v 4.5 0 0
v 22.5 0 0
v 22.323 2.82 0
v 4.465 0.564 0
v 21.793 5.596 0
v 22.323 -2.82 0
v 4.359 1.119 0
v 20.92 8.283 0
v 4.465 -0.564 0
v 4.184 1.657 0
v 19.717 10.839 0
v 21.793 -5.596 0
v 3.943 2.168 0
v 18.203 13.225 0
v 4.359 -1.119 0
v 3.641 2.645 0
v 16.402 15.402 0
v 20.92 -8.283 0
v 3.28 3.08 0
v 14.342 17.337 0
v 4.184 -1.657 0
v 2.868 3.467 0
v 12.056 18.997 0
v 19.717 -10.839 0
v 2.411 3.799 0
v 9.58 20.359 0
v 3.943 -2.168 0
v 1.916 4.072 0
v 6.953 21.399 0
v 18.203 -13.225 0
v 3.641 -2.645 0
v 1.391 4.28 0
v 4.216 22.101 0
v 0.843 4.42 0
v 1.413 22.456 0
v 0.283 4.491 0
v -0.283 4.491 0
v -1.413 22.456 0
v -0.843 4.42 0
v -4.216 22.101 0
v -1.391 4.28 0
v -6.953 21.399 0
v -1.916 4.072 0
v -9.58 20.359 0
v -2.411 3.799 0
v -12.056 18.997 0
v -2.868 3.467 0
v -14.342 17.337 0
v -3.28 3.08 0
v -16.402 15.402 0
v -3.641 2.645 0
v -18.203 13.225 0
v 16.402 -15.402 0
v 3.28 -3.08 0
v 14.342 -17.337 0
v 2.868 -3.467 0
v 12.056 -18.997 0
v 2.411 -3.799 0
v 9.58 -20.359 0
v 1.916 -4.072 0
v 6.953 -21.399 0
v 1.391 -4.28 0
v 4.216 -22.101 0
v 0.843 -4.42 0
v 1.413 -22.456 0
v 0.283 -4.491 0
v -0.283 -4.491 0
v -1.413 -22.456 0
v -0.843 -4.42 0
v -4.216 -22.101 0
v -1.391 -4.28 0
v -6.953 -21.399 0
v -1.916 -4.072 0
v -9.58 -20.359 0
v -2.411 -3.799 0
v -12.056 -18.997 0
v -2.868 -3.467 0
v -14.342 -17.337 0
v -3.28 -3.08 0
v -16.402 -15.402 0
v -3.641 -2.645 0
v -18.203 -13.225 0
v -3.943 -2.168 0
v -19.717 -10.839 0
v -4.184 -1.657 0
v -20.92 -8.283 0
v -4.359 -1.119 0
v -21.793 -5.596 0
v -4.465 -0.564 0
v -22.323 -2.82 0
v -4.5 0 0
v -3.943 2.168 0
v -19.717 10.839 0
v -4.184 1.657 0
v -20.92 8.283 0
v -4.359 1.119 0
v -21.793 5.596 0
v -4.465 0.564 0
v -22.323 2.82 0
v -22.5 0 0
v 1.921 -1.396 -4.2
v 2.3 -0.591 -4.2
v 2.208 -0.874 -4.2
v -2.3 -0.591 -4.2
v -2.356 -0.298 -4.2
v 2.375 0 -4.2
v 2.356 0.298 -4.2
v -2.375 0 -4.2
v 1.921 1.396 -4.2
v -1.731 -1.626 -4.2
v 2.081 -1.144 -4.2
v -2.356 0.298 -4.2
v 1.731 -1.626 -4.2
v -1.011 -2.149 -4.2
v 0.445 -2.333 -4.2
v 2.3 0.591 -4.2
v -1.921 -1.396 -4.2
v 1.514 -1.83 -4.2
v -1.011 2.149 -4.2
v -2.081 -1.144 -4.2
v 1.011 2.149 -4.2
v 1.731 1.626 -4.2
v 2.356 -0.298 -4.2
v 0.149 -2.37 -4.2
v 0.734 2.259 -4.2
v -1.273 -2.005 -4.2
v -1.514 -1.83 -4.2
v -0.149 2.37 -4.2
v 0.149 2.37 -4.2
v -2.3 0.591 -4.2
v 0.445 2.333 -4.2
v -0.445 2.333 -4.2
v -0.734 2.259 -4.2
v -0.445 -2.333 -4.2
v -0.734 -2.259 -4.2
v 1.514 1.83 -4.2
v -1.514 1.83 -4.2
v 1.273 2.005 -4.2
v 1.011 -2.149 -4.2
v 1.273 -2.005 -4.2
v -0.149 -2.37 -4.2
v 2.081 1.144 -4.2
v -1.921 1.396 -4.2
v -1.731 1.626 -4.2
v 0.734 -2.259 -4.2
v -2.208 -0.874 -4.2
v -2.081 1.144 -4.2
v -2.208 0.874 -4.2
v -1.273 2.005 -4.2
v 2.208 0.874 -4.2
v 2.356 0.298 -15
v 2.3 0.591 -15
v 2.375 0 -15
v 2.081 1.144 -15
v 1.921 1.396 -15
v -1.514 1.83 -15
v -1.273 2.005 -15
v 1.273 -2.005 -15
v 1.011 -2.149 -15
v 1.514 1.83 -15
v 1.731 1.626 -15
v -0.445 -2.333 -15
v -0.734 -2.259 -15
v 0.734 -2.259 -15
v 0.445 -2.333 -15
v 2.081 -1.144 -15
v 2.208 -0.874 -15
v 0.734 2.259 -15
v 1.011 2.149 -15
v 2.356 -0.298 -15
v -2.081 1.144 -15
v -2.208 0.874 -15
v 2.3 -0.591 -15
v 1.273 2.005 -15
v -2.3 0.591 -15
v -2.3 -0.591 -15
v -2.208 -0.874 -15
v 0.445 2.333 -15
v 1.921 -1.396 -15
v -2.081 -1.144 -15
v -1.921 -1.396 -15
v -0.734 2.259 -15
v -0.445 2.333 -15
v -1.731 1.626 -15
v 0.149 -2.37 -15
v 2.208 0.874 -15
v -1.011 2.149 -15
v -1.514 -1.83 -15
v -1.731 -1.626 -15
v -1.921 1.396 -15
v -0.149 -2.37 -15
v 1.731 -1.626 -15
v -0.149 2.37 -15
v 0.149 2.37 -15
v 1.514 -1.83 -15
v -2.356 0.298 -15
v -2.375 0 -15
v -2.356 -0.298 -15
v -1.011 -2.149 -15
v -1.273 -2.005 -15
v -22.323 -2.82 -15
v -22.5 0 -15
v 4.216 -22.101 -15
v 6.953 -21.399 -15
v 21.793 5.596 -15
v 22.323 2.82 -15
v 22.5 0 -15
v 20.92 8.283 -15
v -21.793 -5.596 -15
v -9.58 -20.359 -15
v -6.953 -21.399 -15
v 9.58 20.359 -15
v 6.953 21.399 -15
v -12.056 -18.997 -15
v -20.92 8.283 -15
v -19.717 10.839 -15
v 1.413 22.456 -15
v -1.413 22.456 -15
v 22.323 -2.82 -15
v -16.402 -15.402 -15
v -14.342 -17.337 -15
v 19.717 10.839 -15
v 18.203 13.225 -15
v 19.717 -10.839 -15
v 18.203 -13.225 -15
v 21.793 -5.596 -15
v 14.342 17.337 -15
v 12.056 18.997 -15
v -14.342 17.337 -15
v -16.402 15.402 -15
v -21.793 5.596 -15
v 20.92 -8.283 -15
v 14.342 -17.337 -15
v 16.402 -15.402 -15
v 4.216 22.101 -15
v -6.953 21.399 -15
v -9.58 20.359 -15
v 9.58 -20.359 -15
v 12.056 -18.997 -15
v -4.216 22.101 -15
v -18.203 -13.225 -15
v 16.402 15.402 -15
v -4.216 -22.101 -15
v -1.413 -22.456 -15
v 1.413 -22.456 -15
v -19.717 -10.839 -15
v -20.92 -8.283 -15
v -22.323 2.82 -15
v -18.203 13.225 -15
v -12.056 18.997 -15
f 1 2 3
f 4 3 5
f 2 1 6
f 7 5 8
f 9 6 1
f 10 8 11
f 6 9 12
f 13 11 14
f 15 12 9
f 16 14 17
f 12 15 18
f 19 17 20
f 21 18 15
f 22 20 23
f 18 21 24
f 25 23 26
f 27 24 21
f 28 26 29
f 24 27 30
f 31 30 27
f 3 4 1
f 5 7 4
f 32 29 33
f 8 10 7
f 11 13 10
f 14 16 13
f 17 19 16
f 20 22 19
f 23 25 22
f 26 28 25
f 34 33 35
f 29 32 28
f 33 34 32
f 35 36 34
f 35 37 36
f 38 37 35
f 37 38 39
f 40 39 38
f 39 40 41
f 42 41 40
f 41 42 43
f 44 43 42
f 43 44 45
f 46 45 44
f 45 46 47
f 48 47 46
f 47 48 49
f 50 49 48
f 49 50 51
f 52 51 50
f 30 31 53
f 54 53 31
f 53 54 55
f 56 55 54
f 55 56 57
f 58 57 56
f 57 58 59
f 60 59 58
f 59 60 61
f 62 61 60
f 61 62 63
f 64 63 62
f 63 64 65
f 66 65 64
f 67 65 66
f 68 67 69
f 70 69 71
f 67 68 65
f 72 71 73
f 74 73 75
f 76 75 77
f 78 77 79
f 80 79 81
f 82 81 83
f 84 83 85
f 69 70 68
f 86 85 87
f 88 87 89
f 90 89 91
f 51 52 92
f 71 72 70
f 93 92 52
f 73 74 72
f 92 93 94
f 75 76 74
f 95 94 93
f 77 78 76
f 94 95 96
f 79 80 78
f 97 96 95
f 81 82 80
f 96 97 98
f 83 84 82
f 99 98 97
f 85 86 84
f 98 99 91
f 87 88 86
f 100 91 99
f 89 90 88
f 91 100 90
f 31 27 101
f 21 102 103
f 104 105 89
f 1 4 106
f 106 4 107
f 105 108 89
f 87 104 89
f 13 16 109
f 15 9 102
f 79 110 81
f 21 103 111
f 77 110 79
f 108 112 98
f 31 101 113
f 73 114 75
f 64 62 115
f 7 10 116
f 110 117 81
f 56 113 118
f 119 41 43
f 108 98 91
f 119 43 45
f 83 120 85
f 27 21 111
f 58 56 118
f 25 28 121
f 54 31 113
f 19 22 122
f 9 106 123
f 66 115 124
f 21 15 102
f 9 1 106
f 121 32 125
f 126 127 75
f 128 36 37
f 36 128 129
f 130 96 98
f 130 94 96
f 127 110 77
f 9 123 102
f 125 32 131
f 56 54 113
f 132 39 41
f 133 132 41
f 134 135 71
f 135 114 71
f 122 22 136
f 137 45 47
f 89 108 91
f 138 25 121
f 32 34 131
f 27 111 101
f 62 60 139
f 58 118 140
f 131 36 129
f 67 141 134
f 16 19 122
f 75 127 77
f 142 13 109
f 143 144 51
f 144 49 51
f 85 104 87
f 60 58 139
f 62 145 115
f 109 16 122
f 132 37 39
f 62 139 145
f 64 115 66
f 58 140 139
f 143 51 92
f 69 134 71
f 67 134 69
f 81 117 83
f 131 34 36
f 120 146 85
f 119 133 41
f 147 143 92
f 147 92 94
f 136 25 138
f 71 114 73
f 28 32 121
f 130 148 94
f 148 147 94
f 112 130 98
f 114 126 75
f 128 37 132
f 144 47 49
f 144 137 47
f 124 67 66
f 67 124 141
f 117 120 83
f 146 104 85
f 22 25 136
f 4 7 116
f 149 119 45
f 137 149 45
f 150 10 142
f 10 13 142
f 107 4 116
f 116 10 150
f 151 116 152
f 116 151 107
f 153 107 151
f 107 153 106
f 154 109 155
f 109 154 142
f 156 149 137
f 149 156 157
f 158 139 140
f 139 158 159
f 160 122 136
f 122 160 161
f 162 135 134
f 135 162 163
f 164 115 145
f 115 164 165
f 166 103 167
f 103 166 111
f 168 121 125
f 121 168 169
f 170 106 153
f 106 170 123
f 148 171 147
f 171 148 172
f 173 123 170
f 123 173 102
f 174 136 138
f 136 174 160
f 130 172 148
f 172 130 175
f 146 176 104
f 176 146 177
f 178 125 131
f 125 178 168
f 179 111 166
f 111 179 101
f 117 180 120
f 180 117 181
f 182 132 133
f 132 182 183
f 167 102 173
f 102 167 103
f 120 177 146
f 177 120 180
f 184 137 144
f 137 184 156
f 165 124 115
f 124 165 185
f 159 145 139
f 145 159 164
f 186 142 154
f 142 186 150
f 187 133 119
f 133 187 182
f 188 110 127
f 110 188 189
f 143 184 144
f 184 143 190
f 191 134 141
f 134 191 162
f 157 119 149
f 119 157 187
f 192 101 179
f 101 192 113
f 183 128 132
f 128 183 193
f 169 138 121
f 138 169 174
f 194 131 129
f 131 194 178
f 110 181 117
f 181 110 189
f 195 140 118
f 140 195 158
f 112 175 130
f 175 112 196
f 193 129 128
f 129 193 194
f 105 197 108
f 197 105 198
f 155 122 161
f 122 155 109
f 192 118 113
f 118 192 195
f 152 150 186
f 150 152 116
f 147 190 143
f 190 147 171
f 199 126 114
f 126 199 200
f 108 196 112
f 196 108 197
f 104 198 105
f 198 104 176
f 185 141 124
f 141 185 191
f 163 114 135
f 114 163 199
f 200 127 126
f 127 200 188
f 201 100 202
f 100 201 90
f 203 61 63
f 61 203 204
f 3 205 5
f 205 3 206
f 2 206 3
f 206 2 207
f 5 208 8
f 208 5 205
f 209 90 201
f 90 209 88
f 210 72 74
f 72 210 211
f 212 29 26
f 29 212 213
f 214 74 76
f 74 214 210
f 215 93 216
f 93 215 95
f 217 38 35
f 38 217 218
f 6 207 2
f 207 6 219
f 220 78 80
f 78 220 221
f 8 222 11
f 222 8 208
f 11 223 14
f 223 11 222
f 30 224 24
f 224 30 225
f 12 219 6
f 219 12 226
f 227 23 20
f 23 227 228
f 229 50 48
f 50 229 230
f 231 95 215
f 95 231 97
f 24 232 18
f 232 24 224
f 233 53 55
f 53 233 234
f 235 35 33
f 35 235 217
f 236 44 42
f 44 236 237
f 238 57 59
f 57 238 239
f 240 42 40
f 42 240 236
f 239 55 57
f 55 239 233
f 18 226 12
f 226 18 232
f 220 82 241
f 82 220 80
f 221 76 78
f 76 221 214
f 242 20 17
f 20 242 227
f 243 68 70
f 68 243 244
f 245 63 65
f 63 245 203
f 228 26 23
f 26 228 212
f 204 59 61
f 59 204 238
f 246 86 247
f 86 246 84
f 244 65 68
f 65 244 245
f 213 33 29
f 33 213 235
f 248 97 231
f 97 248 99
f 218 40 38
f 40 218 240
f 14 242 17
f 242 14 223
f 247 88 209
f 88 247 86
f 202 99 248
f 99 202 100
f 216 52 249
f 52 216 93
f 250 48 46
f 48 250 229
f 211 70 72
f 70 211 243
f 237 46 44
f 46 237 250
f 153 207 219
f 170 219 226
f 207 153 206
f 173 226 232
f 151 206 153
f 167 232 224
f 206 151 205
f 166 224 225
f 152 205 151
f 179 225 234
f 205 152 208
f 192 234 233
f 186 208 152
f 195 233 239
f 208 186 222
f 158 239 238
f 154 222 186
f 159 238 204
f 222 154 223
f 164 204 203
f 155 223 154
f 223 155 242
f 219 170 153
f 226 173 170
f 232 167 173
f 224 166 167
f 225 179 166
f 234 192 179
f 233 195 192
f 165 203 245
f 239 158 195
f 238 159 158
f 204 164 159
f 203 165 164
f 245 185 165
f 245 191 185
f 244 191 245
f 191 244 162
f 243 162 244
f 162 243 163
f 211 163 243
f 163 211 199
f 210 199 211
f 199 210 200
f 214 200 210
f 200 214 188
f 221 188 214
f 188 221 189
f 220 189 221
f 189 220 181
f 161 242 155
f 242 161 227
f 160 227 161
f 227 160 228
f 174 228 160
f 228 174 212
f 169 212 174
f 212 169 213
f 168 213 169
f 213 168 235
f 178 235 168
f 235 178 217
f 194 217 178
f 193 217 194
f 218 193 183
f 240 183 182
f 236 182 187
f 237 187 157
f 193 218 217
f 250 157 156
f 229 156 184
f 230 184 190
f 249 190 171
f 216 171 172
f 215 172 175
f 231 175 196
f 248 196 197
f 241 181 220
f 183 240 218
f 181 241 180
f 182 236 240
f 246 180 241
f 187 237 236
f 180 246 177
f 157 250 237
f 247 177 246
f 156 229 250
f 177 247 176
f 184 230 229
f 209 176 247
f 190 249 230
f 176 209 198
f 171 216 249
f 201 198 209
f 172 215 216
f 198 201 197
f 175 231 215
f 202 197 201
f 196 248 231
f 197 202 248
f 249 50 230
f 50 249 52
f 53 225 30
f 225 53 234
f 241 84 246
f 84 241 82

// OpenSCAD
$fn = 50;

difference() {
	union() {
		translate(v = [0, 0, -15.0]) {
			cylinder(h = 15, r = 22.5);
		}
	}
	union() {
		translate(v = [0, 0, 0]) {
			rotate(a = [0, 0, 0]) {
				difference() {
					union() {
						translate(v = [0, 0, -18.0]) {
							cylinder(h = 18, r = 2.25);
						}
						translate(v = [0, 0, -4.2]) {
							cylinder(h = 4.2, r1 = 2.375, r2 = 4.5);
						}
						translate(v = [0, 0, -18.0]) {
							cylinder(h = 18, r = 2.375);
						}
						translate(v = [0, 0, -18.0]) {
							cylinder(h = 18, r = 2.25);
						}
					}
					union();
				}
			}
		}
	}
}
